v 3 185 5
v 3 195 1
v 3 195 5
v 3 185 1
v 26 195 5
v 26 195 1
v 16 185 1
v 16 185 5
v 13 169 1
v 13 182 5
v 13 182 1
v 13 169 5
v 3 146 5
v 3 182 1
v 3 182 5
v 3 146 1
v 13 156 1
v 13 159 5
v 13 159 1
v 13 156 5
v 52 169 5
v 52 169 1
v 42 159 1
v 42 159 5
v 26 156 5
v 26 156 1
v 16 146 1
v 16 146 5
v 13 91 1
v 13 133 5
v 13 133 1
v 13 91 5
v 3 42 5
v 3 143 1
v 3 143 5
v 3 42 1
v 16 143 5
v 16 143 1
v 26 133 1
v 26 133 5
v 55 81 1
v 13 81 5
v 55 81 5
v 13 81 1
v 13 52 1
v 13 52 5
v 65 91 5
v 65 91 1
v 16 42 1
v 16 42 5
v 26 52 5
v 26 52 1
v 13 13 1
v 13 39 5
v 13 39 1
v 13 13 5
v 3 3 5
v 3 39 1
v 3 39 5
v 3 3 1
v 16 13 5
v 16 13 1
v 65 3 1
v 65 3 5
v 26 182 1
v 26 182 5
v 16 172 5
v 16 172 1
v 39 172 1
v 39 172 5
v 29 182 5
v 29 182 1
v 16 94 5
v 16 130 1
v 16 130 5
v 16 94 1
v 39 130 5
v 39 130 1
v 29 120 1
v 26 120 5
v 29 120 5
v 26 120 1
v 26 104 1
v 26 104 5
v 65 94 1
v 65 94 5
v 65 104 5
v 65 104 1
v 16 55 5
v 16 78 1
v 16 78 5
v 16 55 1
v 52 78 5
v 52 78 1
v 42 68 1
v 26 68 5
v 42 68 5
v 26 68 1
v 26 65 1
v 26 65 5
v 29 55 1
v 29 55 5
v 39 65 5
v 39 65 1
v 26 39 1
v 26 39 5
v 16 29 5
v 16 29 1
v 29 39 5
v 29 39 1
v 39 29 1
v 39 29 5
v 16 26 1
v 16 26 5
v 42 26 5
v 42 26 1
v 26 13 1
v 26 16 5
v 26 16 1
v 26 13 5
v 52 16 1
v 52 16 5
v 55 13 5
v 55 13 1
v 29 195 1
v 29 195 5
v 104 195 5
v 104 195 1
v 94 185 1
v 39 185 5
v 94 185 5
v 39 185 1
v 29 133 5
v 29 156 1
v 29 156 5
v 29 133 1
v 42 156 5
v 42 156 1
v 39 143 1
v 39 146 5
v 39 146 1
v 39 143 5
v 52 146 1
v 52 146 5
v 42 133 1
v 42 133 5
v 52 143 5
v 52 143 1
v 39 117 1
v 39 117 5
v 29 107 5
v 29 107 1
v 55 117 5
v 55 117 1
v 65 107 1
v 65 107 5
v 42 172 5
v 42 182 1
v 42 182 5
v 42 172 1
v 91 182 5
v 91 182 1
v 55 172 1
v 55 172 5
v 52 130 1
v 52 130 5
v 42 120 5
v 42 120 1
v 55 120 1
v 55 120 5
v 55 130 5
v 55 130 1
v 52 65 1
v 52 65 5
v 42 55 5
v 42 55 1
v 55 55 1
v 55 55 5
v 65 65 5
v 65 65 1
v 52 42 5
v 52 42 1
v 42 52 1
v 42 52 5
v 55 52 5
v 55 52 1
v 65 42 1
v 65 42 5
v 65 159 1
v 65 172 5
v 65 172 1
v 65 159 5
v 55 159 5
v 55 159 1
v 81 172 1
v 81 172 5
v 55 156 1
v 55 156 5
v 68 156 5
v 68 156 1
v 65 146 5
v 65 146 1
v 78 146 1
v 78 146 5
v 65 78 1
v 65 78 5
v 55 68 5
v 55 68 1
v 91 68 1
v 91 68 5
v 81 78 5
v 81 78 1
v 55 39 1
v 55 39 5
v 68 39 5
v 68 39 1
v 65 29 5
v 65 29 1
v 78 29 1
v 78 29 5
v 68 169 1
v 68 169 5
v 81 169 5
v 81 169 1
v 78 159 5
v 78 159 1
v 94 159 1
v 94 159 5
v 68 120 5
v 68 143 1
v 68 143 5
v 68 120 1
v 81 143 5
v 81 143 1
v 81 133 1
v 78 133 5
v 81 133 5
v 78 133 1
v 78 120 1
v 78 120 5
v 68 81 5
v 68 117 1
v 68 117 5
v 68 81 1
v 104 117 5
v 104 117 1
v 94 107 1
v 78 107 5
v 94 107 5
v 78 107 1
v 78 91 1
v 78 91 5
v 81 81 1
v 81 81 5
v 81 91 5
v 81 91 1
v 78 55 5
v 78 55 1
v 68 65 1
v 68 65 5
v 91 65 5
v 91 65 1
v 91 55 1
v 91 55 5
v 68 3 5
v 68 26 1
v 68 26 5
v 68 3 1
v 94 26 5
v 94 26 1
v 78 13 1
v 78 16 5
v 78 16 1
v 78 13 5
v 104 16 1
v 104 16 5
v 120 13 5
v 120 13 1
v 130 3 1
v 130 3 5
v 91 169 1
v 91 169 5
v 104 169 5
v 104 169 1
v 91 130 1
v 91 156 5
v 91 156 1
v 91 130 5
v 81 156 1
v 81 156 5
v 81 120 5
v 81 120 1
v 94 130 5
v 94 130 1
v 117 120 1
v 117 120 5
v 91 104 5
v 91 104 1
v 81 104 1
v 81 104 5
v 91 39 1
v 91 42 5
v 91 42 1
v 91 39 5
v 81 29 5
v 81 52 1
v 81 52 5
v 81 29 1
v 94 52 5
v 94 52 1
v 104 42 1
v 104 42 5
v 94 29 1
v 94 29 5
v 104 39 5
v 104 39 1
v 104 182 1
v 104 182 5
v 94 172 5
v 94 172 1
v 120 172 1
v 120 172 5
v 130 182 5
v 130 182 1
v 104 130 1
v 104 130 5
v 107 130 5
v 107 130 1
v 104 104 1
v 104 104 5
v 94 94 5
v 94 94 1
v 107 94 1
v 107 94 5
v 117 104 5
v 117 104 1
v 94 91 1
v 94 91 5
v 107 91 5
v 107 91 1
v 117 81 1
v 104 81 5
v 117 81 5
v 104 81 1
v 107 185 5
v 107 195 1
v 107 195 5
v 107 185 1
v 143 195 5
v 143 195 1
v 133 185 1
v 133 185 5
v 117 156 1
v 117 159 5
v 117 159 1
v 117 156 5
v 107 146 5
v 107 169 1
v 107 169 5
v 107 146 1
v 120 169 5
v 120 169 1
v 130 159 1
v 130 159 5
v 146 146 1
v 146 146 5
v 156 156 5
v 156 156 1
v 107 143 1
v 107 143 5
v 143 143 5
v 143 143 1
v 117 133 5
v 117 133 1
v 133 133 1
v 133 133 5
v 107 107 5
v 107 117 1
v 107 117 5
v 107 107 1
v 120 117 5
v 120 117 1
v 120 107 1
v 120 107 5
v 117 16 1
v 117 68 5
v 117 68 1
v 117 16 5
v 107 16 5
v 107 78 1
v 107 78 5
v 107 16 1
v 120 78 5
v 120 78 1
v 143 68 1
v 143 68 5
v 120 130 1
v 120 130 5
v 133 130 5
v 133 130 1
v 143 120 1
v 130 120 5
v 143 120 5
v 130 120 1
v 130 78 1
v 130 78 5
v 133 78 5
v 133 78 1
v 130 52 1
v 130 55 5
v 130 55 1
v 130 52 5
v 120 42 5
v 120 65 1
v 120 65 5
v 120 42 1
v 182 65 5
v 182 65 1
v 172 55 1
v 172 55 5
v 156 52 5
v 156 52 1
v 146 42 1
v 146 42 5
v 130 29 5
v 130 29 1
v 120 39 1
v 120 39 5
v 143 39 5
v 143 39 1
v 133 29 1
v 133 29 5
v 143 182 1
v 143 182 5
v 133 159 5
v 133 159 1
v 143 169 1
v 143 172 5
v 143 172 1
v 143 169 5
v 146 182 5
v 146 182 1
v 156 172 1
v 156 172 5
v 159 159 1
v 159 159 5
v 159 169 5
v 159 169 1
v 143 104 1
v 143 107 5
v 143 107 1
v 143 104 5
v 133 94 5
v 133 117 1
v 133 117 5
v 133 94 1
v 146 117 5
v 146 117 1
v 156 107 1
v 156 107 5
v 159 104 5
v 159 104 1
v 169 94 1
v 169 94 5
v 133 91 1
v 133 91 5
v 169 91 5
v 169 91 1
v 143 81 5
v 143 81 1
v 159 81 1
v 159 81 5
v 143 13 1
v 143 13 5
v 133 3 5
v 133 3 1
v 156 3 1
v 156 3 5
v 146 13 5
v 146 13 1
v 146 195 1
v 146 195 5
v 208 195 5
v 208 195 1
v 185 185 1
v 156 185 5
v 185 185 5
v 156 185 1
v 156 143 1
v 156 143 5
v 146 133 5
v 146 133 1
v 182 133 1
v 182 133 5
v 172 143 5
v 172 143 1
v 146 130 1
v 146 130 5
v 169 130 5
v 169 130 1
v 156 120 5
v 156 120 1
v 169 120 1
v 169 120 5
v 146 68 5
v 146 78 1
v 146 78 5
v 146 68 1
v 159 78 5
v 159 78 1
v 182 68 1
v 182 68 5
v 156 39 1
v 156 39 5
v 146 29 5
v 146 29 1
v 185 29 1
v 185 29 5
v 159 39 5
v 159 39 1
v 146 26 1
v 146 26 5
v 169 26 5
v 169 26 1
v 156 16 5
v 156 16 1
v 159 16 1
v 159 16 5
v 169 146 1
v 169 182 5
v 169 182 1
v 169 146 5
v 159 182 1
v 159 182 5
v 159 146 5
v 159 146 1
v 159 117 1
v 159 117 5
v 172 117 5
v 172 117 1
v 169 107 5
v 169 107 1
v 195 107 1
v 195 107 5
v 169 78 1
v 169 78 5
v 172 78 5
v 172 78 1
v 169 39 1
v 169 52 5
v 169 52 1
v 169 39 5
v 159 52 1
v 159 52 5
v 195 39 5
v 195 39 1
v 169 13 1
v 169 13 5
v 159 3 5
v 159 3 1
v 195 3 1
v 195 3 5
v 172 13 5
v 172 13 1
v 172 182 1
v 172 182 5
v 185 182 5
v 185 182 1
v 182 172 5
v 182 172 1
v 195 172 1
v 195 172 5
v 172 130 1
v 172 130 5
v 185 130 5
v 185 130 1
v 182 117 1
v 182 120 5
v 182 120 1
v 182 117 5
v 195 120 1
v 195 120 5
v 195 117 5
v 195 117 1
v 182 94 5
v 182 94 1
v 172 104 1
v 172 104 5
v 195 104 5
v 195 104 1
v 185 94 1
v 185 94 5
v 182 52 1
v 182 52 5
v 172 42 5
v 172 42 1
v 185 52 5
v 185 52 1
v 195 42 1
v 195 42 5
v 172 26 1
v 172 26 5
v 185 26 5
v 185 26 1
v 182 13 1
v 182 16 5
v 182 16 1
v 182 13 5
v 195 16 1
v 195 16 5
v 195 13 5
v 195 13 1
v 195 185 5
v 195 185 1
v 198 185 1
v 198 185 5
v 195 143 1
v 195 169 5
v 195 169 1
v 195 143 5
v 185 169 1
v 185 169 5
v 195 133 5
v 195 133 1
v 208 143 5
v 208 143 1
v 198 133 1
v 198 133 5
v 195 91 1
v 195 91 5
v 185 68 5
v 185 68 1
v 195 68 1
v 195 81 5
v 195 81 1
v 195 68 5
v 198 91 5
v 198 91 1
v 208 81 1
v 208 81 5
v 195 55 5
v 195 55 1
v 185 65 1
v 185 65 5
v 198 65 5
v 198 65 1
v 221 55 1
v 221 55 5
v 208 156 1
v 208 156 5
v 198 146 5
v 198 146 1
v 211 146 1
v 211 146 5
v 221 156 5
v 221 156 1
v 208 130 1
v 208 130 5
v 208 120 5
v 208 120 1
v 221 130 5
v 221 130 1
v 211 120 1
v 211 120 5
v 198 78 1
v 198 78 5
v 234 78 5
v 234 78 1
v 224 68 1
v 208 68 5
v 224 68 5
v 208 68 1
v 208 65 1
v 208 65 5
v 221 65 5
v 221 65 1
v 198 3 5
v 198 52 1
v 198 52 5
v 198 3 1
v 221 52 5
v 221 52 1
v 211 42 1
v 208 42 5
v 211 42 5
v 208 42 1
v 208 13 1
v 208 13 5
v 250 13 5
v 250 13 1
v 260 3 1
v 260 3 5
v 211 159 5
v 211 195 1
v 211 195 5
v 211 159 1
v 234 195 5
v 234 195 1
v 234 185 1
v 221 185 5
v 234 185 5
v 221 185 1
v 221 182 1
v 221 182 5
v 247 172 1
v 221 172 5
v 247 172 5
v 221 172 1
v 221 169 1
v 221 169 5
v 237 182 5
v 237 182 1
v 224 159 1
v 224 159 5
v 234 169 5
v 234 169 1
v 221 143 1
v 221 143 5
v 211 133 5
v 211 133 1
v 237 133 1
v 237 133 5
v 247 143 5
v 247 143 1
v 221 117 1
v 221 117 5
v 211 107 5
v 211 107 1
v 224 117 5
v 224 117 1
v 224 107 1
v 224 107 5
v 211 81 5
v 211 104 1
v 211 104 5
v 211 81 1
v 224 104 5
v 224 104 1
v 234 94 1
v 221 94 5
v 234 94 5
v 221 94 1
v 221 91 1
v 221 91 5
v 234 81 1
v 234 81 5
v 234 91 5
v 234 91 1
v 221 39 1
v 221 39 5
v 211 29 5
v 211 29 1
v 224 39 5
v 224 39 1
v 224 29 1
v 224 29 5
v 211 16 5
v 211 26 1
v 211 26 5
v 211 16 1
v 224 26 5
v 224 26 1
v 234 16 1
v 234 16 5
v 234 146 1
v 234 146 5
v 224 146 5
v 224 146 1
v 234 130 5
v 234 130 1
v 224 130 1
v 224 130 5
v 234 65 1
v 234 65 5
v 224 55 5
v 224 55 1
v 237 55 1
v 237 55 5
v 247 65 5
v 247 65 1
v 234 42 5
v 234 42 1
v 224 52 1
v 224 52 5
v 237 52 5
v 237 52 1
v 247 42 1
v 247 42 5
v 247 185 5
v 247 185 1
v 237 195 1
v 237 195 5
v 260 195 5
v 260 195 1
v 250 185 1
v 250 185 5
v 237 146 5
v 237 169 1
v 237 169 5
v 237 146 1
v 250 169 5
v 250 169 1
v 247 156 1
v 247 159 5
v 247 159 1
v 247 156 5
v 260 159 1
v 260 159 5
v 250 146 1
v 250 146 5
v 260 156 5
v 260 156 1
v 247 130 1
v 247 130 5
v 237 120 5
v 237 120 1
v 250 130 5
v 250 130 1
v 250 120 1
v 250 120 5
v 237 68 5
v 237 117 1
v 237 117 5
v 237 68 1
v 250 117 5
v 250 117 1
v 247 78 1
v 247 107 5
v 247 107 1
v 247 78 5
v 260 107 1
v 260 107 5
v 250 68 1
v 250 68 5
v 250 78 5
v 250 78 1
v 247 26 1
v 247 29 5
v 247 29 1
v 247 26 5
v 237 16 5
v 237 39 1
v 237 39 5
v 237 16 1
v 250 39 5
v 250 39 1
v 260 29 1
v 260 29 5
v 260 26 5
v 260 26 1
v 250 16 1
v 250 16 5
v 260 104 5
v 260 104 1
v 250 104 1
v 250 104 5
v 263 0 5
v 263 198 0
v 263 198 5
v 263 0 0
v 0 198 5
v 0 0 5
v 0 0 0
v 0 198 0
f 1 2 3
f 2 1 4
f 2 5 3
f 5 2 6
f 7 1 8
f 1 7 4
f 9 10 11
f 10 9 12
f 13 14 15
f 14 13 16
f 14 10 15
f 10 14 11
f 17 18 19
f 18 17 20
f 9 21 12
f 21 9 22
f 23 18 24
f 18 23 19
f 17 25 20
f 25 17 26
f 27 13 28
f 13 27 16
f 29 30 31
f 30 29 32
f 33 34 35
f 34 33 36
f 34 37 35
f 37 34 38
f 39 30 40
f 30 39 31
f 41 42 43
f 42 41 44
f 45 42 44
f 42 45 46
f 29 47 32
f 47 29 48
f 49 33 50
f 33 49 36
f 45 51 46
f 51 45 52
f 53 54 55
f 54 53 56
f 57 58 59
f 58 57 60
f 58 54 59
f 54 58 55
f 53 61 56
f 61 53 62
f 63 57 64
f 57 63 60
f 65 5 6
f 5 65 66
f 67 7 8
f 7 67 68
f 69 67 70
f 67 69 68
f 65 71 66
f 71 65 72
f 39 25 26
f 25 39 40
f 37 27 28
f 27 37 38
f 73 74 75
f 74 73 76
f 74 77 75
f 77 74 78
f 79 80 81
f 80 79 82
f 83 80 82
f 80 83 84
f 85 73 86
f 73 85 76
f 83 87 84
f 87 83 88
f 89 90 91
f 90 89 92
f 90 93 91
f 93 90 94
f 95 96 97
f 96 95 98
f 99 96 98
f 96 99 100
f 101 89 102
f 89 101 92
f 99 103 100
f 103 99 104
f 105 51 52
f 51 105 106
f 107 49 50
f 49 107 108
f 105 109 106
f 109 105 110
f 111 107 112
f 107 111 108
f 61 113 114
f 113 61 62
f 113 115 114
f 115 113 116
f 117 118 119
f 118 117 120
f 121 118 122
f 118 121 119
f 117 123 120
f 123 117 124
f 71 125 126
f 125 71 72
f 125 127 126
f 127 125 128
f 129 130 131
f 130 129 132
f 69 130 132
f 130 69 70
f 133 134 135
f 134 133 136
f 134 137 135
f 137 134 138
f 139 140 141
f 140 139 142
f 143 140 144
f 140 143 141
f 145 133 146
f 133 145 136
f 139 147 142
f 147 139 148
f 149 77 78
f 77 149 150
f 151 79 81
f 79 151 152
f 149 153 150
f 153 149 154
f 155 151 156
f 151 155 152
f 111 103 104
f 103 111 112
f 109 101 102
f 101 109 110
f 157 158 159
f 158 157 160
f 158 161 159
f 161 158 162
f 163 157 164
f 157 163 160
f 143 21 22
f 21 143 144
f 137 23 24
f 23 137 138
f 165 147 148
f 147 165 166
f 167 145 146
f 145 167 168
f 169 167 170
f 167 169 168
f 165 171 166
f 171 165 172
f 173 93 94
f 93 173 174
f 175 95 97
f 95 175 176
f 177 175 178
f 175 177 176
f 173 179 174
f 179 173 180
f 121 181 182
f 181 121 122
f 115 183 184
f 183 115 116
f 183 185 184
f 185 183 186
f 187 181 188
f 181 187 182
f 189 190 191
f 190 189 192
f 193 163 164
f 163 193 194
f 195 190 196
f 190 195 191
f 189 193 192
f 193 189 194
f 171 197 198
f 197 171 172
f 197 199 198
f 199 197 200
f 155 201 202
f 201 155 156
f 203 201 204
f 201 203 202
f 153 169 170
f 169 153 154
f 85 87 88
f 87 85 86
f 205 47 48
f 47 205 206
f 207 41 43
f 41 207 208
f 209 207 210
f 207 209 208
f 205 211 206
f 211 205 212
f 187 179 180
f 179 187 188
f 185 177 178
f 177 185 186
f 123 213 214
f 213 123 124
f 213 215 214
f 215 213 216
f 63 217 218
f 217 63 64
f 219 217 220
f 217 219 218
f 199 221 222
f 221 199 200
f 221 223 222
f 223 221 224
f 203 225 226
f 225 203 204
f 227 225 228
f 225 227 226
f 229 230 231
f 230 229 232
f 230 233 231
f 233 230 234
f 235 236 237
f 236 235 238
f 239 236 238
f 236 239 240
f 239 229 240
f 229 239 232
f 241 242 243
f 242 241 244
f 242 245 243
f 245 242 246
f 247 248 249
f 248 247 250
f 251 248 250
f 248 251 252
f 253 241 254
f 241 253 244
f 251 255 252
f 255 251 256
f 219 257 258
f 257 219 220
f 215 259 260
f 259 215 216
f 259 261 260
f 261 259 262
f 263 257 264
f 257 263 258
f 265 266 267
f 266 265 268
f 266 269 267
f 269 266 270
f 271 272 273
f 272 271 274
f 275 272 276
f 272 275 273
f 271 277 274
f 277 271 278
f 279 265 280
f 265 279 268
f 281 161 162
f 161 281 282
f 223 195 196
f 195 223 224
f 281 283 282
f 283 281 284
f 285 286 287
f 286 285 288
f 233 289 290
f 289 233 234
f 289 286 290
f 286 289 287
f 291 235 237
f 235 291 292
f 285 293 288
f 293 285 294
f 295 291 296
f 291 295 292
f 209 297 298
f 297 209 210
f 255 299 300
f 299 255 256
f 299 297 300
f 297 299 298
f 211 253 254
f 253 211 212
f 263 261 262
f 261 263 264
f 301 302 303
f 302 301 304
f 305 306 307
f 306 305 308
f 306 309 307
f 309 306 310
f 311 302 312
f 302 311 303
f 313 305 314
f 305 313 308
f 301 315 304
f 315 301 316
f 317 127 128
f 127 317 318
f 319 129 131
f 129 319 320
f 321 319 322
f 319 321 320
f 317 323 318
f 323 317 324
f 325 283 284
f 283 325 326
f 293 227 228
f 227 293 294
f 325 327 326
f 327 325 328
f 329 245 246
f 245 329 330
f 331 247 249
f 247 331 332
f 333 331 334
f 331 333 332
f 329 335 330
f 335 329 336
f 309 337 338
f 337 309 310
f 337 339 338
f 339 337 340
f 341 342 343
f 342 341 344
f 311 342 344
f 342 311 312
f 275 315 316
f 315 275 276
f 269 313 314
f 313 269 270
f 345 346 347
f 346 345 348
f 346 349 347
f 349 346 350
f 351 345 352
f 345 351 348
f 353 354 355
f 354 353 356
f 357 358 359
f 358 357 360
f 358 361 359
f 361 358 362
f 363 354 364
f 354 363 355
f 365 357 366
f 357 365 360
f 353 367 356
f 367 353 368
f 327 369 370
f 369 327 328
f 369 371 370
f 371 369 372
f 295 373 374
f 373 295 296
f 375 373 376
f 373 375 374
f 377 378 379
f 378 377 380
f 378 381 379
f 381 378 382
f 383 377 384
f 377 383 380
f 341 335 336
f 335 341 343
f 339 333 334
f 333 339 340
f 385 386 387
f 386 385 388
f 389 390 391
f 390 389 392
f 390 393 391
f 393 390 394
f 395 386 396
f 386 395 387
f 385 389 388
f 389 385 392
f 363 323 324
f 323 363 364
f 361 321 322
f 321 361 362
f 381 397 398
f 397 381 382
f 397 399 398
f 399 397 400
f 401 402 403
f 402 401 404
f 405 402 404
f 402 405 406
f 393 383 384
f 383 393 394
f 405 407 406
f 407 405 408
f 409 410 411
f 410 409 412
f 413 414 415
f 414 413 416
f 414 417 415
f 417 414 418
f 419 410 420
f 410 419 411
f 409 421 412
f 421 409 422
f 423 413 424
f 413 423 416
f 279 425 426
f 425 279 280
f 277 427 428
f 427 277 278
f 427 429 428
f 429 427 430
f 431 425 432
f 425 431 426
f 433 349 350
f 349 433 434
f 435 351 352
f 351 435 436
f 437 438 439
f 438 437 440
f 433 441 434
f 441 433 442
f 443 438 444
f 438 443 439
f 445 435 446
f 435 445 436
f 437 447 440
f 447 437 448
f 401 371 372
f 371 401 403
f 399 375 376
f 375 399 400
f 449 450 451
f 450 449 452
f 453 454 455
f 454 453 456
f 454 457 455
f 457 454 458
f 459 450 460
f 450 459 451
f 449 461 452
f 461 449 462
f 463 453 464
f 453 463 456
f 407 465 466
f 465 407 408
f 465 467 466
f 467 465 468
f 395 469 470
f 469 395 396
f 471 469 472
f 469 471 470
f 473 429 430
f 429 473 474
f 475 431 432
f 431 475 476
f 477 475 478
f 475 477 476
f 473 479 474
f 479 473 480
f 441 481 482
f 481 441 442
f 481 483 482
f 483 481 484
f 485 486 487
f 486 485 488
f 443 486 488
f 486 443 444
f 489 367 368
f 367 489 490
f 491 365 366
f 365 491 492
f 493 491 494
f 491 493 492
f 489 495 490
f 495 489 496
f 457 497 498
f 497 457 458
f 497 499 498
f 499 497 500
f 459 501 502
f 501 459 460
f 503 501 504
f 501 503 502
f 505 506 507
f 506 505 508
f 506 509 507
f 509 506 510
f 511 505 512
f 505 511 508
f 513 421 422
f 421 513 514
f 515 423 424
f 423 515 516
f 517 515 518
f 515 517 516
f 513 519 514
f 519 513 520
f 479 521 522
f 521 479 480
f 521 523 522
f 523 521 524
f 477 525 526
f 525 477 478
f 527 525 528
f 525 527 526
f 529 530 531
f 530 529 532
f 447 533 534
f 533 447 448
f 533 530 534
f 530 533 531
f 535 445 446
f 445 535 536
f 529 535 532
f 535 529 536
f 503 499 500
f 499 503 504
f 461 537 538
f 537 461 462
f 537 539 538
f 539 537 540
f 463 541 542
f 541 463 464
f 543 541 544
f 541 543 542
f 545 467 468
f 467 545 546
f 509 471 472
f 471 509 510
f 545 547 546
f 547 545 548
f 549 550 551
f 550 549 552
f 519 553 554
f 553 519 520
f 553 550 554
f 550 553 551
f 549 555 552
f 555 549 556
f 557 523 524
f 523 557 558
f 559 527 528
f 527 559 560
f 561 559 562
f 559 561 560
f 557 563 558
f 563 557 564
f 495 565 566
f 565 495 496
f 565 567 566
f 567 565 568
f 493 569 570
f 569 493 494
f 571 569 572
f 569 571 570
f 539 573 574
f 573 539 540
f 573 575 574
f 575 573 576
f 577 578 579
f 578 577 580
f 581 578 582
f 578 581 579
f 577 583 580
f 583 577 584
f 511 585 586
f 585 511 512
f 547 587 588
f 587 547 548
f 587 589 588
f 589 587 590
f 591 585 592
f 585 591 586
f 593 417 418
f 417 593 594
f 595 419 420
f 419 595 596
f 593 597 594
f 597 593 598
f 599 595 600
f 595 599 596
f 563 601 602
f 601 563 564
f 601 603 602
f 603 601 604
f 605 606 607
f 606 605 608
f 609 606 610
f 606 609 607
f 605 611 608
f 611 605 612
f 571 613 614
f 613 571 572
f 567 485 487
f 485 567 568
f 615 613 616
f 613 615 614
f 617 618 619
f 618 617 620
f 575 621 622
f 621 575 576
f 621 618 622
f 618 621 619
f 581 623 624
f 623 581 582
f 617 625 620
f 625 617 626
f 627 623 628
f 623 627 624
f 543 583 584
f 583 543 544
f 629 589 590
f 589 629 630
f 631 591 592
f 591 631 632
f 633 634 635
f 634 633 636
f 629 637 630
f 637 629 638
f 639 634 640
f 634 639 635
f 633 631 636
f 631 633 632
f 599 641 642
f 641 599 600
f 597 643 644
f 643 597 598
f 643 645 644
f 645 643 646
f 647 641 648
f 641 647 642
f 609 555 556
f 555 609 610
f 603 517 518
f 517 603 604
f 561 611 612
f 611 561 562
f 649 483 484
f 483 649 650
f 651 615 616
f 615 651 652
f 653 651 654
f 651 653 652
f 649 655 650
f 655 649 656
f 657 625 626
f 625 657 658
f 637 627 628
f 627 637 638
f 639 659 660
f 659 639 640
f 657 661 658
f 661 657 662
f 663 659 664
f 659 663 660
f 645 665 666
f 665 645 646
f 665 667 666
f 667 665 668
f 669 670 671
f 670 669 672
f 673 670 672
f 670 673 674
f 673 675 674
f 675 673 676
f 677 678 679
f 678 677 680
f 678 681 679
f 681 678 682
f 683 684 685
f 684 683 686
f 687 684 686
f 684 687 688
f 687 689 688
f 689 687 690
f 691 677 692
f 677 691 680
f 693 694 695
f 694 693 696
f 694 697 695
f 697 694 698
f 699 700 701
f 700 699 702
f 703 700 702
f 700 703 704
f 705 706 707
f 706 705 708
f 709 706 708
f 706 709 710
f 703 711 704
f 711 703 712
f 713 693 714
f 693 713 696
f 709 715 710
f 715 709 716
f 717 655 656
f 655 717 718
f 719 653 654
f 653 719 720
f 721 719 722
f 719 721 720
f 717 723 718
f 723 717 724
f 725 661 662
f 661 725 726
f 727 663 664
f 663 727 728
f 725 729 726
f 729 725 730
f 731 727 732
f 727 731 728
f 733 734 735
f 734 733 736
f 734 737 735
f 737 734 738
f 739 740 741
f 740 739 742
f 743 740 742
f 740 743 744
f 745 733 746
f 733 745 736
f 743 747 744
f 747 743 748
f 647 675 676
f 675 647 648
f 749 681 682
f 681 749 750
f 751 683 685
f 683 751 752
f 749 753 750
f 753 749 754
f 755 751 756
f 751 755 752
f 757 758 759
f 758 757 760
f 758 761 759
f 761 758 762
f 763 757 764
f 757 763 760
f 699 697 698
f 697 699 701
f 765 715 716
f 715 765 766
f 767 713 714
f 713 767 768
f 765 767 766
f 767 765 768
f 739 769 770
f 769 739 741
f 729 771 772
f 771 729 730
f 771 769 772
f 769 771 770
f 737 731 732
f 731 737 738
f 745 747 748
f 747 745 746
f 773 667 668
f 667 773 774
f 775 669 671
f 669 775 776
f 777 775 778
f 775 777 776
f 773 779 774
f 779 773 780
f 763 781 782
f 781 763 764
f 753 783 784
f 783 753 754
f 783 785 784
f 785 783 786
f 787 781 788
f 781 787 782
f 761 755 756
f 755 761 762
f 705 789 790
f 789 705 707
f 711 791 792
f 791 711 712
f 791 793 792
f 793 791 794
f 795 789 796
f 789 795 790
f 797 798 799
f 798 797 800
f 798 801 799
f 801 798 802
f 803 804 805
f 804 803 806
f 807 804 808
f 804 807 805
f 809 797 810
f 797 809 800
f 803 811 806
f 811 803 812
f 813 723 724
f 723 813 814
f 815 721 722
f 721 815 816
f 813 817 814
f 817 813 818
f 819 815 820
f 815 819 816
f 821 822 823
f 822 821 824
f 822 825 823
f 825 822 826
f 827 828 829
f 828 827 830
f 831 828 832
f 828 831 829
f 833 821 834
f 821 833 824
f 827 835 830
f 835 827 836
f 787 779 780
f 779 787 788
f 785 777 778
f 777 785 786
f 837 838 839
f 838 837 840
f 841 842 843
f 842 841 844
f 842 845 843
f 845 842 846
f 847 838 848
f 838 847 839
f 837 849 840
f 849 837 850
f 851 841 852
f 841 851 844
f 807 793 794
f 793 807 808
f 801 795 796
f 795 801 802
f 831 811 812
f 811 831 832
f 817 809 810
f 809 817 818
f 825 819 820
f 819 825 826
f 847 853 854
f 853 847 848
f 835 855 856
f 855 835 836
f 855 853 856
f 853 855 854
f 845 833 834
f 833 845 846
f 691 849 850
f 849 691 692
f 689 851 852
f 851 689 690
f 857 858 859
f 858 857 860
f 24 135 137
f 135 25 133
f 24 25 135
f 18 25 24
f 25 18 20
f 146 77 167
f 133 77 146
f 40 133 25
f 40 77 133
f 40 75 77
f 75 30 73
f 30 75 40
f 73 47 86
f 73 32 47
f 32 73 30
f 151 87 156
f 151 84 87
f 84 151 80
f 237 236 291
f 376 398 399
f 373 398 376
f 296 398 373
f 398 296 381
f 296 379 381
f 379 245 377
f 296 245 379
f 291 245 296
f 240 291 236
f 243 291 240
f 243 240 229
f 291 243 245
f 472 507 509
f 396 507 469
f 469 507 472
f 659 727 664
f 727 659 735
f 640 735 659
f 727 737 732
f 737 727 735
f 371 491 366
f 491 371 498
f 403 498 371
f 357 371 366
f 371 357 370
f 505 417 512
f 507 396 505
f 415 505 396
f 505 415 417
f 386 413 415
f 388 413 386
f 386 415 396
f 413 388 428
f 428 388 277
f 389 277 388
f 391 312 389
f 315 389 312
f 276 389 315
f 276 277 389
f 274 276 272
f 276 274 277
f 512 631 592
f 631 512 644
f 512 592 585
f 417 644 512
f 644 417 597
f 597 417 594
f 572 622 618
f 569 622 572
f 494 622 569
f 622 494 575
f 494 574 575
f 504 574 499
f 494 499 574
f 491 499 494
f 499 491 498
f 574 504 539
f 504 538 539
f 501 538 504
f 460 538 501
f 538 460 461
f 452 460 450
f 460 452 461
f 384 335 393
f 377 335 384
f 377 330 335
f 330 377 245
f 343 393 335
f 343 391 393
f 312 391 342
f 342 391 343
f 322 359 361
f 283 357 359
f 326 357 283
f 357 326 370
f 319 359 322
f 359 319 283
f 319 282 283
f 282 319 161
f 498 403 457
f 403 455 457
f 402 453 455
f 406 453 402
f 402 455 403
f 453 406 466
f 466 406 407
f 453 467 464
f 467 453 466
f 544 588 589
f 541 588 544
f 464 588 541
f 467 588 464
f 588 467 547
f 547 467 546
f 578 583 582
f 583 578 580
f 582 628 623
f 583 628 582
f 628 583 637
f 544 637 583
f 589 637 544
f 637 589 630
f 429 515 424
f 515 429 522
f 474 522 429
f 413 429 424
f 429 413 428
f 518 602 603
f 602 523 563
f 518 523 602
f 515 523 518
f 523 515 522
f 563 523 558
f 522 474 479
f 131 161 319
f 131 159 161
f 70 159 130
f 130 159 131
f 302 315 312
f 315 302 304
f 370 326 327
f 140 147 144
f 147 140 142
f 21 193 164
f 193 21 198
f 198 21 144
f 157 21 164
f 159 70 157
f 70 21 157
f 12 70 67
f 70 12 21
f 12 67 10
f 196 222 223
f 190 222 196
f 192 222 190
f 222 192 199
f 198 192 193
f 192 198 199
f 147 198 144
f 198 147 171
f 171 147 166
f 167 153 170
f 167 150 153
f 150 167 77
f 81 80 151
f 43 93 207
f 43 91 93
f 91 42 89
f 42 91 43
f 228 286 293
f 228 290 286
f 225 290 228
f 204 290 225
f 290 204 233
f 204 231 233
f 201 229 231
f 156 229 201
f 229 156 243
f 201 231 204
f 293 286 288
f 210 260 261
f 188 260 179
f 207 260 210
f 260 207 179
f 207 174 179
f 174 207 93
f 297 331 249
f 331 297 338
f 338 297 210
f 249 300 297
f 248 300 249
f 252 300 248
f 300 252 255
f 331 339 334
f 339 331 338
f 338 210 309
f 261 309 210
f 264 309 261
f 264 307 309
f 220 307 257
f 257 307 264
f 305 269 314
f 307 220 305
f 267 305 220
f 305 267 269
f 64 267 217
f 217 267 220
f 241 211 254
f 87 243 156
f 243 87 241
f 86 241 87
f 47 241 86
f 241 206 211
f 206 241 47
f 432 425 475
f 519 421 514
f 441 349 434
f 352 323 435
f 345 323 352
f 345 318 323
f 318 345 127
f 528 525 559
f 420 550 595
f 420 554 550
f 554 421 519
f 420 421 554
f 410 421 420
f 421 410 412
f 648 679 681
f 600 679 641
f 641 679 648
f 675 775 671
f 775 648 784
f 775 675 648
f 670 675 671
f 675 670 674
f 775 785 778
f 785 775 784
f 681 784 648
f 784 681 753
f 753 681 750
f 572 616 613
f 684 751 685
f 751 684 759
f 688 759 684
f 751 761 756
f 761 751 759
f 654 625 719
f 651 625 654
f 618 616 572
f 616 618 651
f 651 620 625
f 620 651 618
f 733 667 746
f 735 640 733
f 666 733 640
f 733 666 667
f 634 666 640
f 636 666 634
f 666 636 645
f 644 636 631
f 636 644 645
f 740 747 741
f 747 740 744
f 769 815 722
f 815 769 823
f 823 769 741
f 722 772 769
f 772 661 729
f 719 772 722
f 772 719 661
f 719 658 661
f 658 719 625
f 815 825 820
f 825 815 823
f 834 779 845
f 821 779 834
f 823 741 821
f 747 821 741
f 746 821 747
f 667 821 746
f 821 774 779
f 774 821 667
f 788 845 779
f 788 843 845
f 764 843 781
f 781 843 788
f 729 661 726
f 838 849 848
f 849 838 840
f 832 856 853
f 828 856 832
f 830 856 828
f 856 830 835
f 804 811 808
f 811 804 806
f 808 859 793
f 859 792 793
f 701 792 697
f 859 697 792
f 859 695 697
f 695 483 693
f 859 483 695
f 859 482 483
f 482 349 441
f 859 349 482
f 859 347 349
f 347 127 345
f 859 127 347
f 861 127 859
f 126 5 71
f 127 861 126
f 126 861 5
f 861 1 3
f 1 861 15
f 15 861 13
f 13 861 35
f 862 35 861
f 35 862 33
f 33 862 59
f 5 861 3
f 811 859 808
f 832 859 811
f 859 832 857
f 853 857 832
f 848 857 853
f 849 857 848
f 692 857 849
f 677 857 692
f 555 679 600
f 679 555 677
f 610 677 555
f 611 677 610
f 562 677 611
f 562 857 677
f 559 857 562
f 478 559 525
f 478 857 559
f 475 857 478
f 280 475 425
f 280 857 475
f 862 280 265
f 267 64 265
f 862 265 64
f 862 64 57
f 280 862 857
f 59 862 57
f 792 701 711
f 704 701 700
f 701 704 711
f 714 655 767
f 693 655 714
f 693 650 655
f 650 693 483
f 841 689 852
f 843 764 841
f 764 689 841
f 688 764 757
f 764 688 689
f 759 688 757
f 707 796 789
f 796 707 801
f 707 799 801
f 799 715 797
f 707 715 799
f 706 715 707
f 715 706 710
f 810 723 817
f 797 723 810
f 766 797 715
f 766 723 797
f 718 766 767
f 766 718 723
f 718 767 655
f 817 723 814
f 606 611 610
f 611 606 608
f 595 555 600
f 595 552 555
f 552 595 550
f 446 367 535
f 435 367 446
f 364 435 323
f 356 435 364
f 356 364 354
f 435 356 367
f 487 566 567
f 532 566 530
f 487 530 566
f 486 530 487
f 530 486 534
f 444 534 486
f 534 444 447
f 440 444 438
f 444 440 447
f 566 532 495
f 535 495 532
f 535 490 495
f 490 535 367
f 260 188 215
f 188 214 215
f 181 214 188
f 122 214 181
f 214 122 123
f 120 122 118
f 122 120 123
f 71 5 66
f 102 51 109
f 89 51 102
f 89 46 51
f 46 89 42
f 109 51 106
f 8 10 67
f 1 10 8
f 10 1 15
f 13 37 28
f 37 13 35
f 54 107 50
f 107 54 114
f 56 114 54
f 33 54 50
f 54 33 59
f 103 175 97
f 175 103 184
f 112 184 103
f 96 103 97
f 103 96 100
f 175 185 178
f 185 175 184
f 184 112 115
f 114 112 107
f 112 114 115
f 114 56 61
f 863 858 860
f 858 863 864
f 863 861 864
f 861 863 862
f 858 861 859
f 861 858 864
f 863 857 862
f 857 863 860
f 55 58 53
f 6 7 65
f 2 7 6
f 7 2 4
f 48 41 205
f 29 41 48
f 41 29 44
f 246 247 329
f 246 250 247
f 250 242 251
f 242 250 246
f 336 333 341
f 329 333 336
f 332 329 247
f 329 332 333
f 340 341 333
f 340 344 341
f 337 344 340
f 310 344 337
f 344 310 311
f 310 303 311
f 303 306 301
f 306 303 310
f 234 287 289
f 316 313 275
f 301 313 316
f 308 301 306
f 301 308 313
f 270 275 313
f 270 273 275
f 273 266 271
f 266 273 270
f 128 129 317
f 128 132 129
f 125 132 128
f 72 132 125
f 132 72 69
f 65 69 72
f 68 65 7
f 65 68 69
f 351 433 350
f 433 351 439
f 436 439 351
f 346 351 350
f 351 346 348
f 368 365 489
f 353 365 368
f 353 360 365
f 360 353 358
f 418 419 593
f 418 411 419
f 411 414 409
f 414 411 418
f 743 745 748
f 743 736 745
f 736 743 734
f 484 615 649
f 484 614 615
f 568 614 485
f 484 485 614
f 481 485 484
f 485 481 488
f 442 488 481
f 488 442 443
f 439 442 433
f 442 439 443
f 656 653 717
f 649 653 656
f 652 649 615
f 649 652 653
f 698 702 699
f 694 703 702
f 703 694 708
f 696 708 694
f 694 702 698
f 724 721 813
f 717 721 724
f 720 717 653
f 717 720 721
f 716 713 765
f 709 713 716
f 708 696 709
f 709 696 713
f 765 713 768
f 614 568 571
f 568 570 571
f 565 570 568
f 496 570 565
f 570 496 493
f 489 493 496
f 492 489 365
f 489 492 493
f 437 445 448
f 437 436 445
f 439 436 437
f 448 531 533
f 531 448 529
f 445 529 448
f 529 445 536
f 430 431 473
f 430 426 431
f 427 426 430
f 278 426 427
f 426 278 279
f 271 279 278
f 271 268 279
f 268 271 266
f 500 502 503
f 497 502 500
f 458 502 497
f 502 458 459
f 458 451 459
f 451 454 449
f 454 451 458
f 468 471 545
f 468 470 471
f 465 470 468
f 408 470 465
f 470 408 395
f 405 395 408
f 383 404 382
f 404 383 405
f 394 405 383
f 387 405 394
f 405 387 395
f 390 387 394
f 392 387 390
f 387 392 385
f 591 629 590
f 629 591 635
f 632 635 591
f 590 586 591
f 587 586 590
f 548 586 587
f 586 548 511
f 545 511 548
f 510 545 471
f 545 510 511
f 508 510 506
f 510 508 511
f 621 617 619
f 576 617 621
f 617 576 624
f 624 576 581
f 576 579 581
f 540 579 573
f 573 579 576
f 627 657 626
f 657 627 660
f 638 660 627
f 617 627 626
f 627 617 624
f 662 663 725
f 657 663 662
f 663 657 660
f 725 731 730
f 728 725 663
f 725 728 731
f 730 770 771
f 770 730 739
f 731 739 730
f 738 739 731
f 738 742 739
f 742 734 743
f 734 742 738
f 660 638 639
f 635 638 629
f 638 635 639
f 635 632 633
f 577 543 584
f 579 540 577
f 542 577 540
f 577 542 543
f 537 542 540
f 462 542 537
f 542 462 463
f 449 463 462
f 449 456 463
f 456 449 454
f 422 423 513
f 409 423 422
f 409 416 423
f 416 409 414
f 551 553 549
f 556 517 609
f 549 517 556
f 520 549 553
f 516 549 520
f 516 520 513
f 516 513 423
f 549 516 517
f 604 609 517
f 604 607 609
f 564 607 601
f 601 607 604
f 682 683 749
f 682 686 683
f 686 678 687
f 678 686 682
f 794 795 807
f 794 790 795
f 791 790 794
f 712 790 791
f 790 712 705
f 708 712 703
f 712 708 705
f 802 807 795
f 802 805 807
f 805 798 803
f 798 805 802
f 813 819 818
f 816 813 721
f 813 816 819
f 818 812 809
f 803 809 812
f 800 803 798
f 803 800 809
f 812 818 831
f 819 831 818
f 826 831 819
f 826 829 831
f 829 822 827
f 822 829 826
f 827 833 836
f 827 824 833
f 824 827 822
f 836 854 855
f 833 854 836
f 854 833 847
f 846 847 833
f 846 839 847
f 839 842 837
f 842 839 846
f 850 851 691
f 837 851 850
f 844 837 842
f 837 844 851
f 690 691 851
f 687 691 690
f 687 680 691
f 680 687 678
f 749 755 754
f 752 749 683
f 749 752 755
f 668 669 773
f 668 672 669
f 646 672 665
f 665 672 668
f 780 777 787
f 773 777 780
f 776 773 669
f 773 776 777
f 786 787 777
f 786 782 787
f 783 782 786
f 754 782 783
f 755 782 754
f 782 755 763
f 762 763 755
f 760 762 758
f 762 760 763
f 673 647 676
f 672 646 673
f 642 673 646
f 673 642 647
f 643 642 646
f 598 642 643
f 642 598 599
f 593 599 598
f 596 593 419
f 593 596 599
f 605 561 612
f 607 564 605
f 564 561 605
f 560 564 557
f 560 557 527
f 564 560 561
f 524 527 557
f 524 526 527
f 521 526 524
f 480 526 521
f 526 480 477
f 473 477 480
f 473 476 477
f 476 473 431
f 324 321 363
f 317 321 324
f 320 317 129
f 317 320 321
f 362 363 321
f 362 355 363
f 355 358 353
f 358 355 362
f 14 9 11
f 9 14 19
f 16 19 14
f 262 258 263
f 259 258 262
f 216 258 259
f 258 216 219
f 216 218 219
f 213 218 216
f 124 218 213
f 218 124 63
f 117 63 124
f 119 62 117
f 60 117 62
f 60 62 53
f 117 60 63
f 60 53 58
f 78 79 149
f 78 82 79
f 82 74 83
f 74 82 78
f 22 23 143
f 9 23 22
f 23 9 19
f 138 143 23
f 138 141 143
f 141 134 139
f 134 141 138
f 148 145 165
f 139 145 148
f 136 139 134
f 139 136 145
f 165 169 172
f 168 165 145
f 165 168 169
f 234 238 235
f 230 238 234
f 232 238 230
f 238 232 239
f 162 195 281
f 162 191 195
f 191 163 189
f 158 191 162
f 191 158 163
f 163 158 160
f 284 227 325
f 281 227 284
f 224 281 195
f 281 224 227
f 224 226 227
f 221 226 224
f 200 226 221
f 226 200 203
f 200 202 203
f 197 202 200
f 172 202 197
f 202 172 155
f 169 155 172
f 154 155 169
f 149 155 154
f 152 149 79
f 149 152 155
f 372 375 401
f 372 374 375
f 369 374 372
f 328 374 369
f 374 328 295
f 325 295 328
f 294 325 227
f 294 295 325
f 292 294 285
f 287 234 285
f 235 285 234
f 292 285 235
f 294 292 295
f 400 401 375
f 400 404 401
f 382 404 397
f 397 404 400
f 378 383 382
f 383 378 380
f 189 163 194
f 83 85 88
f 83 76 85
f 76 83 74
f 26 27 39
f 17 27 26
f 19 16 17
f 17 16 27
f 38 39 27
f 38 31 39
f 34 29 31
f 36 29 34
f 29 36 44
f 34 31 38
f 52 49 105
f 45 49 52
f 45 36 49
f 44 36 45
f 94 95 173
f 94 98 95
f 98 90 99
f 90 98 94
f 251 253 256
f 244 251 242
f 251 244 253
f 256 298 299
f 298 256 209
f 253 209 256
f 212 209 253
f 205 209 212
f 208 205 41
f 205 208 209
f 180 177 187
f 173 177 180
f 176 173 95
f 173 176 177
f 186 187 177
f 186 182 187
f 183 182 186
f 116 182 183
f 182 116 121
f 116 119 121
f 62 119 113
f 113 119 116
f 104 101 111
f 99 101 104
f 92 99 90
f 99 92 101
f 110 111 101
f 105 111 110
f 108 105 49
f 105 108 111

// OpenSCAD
// file: maze-data.scad
// code generated maze data
columns = 20;
rows = 15;
connections = [
//  [r,c,S,E]
// S = 0, cut South Wall
// E = 0, cut East Wall
// Column: 0;
	[0,0,1,0],
	[1,0,0,1],
	[2,0,0,0],
	[3,0,1,0],
	[4,0,0,0],
	[5,0,0,1],
	[6,0,0,1],
	[7,0,0,1],
	[8,0,0,0],
	[9,0,0,1],
	[10,0,0,1],
	[11,0,1,0],
	[12,0,0,1],
	[13,0,0,1],
	[14,0,1,0],
// Column: 1;
	[0,1,0,1],
	[1,1,1,0],
	[2,1,1,0],
	[3,1,0,1],
	[4,1,1,1],
	[5,1,0,0],
	[6,1,0,1],
	[7,1,1,0],
	[8,1,1,0],
	[9,1,0,0],
	[10,1,1,0],
	[11,1,0,1],
	[12,1,1,0],
	[13,1,0,0],
	[14,1,1,0],
// Column: 2;
	[0,2,0,0],
	[1,2,1,1],
	[2,2,1,0],
	[3,2,0,0],
	[4,2,1,0],
	[5,2,0,1],
	[6,2,1,0],
	[7,2,1,0],
	[8,2,1,0],
	[9,2,1,0],
	[10,2,0,1],
	[11,2,0,1],
	[12,2,1,1],
	[13,2,1,0],
	[14,2,1,0],
// Column: 3;
	[0,3,1,0],
	[1,3,1,0],
	[2,3,0,1],
	[3,3,1,1],
	[4,3,0,1],
	[5,3,1,0],
	[6,3,1,0],
	[7,3,1,0],
	[8,3,1,0],
	[9,3,0,1],
	[10,3,1,0],
	[11,3,0,0],
	[12,3,0,1],
	[13,3,1,1],
	[14,3,1,0],
// Column: 4;
	[0,4,1,0],
	[1,4,0,0],
	[2,4,1,1],
	[3,4,0,0],
	[4,4,0,1],
	[5,4,0,1],
	[6,4,1,1],
	[7,4,1,1],
	[8,4,0,1],
	[9,4,1,0],
	[10,4,0,1],
	[11,4,1,1],
	[12,4,0,0],
	[13,4,0,1],
	[14,4,1,1],
// Column: 5;
	[0,5,1,0],
	[1,5,1,0],
	[2,5,0,0],
	[3,5,1,1],
	[4,5,0,0],
	[5,5,1,1],
	[6,5,0,0],
	[7,5,0,1],
	[8,5,1,0],
	[9,5,1,0],
	[10,5,0,0],
	[11,5,0,1],
	[12,5,1,1],
	[13,5,0,0],
	[14,5,1,0],
// Column: 6;
	[0,6,1,0],
	[1,6,0,1],
	[2,6,1,0],
	[3,6,0,1],
	[4,6,0,1],
	[5,6,1,0],
	[6,6,1,0],
	[7,6,0,1],
	[8,6,0,1],
	[9,6,1,1],
	[10,6,1,1],
	[11,6,0,0],
	[12,6,1,0],
	[13,6,1,0],
	[14,6,1,0],
// Column: 7;
	[0,7,0,1],
	[1,7,1,0],
	[2,7,0,1],
	[3,7,0,1],
	[4,7,0,1],
	[5,7,1,0],
	[6,7,0,1],
	[7,7,1,0],
	[8,7,0,0],
	[9,7,0,1],
	[10,7,0,1],
	[11,7,1,1],
	[12,7,0,1],
	[13,7,1,1],
	[14,7,1,0],
// Column: 8;
	[0,8,1,0],
	[1,8,1,0],
	[2,8,0,0],
	[3,8,1,0],
	[4,8,0,0],
	[5,8,1,1],
	[6,8,1,0],
	[7,8,0,1],
	[8,8,1,1],
	[9,8,0,0],
	[10,8,0,1],
	[11,8,0,1],
	[12,8,0,1],
	[13,8,1,1],
	[14,8,1,0],
// Column: 9;
	[0,9,1,0],
	[1,9,0,1],
	[2,9,1,1],
	[3,9,1,0],
	[4,9,1,0],
	[5,9,0,0],
	[6,9,0,1],
	[7,9,0,1],
	[8,9,0,1],
	[9,9,1,0],
	[10,9,0,0],
	[11,9,1,0],
	[12,9,0,0],
	[13,9,0,1],
	[14,9,1,1],
// Column: 10;
	[0,10,0,1],
	[1,10,0,0],
	[2,10,1,0],
	[3,10,1,0],
	[4,10,0,1],
	[5,10,1,1],
	[6,10,0,0],
	[7,10,1,0],
	[8,10,0,0],
	[9,10,1,1],
	[10,10,1,0],
	[11,10,1,0],
	[12,10,0,1],
	[13,10,0,1],
	[14,10,1,0],
// Column: 11;
	[0,11,0,0],
	[1,11,1,1],
	[2,11,1,0],
	[3,11,0,1],
	[4,11,1,0],
	[5,11,0,0],
	[6,11,1,1],
	[7,11,1,0],
	[8,11,1,0],
	[9,11,1,0],
	[10,11,1,0],
	[11,11,0,1],
	[12,11,1,0],
	[13,11,0,0],
	[14,11,1,1],
// Column: 12;
	[0,12,1,0],
	[1,12,0,1],
	[2,12,0,1],
	[3,12,1,1],
	[4,12,1,0],
	[5,12,1,1],
	[6,12,0,0],
	[7,12,1,1],
	[8,12,0,1],
	[9,12,1,0],
	[10,12,1,0],
	[11,12,0,1],
	[12,12,1,0],
	[13,12,0,1],
	[14,12,1,0],
// Column: 13;
	[0,13,1,0],
	[1,13,0,0],
	[2,13,0,1],
	[3,13,0,1],
	[4,13,1,1],
	[5,13,0,0],
	[6,13,1,0],
	[7,13,0,0],
	[8,13,0,1],
	[9,13,1,1],
	[10,13,0,1],
	[11,13,1,0],
	[12,13,1,0],
	[13,13,0,0],
	[14,13,1,0],
// Column: 14;
	[0,14,0,0],
	[1,14,1,1],
	[2,14,0,1],
	[3,14,0,1],
	[4,14,0,0],
	[5,14,1,1],
	[6,14,1,1],
	[7,14,0,1],
	[8,14,0,0],
	[9,14,1,1],
	[10,14,0,0],
	[11,14,1,1],
	[12,14,0,1],
	[13,14,1,1],
	[14,14,1,1],
// Column: 15;
	[0,15,0,1],
	[1,15,0,1],
	[2,15,0,1],
	[3,15,1,0],
	[4,15,0,1],
	[5,15,0,0],
	[6,15,0,1],
	[7,15,0,1],
	[8,15,1,1],
	[9,15,0,0],
	[10,15,1,0],
	[11,15,0,0],
	[12,15,0,1],
	[13,15,0,1],
	[14,15,1,0],
// Column: 16;
	[0,16,0,0],
	[1,16,0,0],
	[2,16,1,0],
	[3,16,0,1],
	[4,16,1,0],
	[5,16,0,1],
	[6,16,1,0],
	[7,16,0,0],
	[8,16,1,0],
	[9,16,1,0],
	[10,16,1,1],
	[11,16,0,1],
	[12,16,1,0],
	[13,16,1,0],
	[14,16,1,0],
// Column: 17;
	[0,17,1,1],
	[1,17,1,0],
	[2,17,0,1],
	[3,17,1,1],
	[4,17,1,0],
	[5,17,0,1],
	[6,17,0,1],
	[7,17,1,1],
	[8,17,1,1],
	[9,17,0,1],
	[10,17,1,0],
	[11,17,0,0],
	[12,17,0,1],
	[13,17,1,1],
	[14,17,1,0],
// Column: 18;
	[0,18,0,0],
	[1,18,1,1],
	[2,18,0,0],
	[3,18,1,0],
	[4,18,0,1],
	[5,18,1,0],
	[6,18,0,0],
	[7,18,0,1],
	[8,18,0,1],
	[9,18,1,0],
	[10,18,0,1],
	[11,18,1,1],
	[12,18,0,0],
	[13,18,1,0],
	[14,18,1,0],
// Column: 19;
	[0,19,0,1],
	[1,19,0,1],
	[2,19,1,1],
	[3,19,0,1],
	[4,19,0,1],
	[5,19,0,1],
	[6,19,1,1],
	[7,19,0,1],
	[8,19,0,1],
	[9,19,0,1],
	[10,19,0,1],
	[11,19,0,1],
	[12,19,1,1],
	[13,19,0,1],
	[14,19,1,1]
];
// main file
// Author: Mitch Allen
// File: maze.scad

include <maze-data.scad>

cellSize = 10;
wallSize = 3;
wallCutPadding = 1; // so sliver not left behind when wall cut out
panelSize = cellSize + wallSize;

mazePanelWidth = columns * panelSize + wallSize;
mazePanelHeight = rows * panelSize + wallSize;
mazePanelThickness = 5;
mazeFloorThickness = 1;
// Wall height needs to be large enough to not leave sliver 
// at bottom when cut out
wallHeight = mazePanelThickness * 2;
// Put 25% below zero so it completely goes through panel bottom
wallHeightOffset = 0 - wallHeight / 4;

floorColor = [0,1,0];
wallColor = [0,0,0];

module drawMazePanel() {
    color(wallColor) 
        cube(size = [mazePanelWidth,mazePanelHeight,mazePanelThickness]);
}

module drawMazeFloor() {
    color(floorColor) 
        cube(size = [mazePanelWidth,mazePanelHeight,mazeFloorThickness]);
}

module cutWalls() {
    // subtract cube cells
    for(el = [0:len(connections)-1]) {
        cell = connections[el];
        echo("CELL: ", cell);
        x = cell[0];
        y = cell[1];
        southWall = cell[2];
        eastWall = cell[3];
        
        cx = mazePanelHeight - (panelSize * (x+1));
        cy = wallSize + panelSize * y;
        
        tx = [ cy, cx, wallHeightOffset ];
        translate( tx ) cube( size = [cellSize, cellSize, wallHeight] );
        
        if( southWall == 0) {
            
            // cut south wall
            
            tx = [
                cy, 
                cx - wallCutPadding * 4, 
                wallHeightOffset ];
            
            translate( tx ) cube( size = [
                cellSize, wallSize + wallCutPadding * 2, wallHeight] );
        }
       
        if( eastWall == 0 ) {
            
            // cut east wall
            
            tx = [
                cy + cellSize  - wallCutPadding, 
                cx, 
                wallHeightOffset ];

            translate( tx ) cube( size = [
                wallSize + wallCutPadding * 2, cellSize, wallHeight] );
        }
    }
}

module main() {
    union() {
        difference() {
            drawMazePanel();
            cutWalls();
        }
        drawMazeFloor();
    }
}

main();
